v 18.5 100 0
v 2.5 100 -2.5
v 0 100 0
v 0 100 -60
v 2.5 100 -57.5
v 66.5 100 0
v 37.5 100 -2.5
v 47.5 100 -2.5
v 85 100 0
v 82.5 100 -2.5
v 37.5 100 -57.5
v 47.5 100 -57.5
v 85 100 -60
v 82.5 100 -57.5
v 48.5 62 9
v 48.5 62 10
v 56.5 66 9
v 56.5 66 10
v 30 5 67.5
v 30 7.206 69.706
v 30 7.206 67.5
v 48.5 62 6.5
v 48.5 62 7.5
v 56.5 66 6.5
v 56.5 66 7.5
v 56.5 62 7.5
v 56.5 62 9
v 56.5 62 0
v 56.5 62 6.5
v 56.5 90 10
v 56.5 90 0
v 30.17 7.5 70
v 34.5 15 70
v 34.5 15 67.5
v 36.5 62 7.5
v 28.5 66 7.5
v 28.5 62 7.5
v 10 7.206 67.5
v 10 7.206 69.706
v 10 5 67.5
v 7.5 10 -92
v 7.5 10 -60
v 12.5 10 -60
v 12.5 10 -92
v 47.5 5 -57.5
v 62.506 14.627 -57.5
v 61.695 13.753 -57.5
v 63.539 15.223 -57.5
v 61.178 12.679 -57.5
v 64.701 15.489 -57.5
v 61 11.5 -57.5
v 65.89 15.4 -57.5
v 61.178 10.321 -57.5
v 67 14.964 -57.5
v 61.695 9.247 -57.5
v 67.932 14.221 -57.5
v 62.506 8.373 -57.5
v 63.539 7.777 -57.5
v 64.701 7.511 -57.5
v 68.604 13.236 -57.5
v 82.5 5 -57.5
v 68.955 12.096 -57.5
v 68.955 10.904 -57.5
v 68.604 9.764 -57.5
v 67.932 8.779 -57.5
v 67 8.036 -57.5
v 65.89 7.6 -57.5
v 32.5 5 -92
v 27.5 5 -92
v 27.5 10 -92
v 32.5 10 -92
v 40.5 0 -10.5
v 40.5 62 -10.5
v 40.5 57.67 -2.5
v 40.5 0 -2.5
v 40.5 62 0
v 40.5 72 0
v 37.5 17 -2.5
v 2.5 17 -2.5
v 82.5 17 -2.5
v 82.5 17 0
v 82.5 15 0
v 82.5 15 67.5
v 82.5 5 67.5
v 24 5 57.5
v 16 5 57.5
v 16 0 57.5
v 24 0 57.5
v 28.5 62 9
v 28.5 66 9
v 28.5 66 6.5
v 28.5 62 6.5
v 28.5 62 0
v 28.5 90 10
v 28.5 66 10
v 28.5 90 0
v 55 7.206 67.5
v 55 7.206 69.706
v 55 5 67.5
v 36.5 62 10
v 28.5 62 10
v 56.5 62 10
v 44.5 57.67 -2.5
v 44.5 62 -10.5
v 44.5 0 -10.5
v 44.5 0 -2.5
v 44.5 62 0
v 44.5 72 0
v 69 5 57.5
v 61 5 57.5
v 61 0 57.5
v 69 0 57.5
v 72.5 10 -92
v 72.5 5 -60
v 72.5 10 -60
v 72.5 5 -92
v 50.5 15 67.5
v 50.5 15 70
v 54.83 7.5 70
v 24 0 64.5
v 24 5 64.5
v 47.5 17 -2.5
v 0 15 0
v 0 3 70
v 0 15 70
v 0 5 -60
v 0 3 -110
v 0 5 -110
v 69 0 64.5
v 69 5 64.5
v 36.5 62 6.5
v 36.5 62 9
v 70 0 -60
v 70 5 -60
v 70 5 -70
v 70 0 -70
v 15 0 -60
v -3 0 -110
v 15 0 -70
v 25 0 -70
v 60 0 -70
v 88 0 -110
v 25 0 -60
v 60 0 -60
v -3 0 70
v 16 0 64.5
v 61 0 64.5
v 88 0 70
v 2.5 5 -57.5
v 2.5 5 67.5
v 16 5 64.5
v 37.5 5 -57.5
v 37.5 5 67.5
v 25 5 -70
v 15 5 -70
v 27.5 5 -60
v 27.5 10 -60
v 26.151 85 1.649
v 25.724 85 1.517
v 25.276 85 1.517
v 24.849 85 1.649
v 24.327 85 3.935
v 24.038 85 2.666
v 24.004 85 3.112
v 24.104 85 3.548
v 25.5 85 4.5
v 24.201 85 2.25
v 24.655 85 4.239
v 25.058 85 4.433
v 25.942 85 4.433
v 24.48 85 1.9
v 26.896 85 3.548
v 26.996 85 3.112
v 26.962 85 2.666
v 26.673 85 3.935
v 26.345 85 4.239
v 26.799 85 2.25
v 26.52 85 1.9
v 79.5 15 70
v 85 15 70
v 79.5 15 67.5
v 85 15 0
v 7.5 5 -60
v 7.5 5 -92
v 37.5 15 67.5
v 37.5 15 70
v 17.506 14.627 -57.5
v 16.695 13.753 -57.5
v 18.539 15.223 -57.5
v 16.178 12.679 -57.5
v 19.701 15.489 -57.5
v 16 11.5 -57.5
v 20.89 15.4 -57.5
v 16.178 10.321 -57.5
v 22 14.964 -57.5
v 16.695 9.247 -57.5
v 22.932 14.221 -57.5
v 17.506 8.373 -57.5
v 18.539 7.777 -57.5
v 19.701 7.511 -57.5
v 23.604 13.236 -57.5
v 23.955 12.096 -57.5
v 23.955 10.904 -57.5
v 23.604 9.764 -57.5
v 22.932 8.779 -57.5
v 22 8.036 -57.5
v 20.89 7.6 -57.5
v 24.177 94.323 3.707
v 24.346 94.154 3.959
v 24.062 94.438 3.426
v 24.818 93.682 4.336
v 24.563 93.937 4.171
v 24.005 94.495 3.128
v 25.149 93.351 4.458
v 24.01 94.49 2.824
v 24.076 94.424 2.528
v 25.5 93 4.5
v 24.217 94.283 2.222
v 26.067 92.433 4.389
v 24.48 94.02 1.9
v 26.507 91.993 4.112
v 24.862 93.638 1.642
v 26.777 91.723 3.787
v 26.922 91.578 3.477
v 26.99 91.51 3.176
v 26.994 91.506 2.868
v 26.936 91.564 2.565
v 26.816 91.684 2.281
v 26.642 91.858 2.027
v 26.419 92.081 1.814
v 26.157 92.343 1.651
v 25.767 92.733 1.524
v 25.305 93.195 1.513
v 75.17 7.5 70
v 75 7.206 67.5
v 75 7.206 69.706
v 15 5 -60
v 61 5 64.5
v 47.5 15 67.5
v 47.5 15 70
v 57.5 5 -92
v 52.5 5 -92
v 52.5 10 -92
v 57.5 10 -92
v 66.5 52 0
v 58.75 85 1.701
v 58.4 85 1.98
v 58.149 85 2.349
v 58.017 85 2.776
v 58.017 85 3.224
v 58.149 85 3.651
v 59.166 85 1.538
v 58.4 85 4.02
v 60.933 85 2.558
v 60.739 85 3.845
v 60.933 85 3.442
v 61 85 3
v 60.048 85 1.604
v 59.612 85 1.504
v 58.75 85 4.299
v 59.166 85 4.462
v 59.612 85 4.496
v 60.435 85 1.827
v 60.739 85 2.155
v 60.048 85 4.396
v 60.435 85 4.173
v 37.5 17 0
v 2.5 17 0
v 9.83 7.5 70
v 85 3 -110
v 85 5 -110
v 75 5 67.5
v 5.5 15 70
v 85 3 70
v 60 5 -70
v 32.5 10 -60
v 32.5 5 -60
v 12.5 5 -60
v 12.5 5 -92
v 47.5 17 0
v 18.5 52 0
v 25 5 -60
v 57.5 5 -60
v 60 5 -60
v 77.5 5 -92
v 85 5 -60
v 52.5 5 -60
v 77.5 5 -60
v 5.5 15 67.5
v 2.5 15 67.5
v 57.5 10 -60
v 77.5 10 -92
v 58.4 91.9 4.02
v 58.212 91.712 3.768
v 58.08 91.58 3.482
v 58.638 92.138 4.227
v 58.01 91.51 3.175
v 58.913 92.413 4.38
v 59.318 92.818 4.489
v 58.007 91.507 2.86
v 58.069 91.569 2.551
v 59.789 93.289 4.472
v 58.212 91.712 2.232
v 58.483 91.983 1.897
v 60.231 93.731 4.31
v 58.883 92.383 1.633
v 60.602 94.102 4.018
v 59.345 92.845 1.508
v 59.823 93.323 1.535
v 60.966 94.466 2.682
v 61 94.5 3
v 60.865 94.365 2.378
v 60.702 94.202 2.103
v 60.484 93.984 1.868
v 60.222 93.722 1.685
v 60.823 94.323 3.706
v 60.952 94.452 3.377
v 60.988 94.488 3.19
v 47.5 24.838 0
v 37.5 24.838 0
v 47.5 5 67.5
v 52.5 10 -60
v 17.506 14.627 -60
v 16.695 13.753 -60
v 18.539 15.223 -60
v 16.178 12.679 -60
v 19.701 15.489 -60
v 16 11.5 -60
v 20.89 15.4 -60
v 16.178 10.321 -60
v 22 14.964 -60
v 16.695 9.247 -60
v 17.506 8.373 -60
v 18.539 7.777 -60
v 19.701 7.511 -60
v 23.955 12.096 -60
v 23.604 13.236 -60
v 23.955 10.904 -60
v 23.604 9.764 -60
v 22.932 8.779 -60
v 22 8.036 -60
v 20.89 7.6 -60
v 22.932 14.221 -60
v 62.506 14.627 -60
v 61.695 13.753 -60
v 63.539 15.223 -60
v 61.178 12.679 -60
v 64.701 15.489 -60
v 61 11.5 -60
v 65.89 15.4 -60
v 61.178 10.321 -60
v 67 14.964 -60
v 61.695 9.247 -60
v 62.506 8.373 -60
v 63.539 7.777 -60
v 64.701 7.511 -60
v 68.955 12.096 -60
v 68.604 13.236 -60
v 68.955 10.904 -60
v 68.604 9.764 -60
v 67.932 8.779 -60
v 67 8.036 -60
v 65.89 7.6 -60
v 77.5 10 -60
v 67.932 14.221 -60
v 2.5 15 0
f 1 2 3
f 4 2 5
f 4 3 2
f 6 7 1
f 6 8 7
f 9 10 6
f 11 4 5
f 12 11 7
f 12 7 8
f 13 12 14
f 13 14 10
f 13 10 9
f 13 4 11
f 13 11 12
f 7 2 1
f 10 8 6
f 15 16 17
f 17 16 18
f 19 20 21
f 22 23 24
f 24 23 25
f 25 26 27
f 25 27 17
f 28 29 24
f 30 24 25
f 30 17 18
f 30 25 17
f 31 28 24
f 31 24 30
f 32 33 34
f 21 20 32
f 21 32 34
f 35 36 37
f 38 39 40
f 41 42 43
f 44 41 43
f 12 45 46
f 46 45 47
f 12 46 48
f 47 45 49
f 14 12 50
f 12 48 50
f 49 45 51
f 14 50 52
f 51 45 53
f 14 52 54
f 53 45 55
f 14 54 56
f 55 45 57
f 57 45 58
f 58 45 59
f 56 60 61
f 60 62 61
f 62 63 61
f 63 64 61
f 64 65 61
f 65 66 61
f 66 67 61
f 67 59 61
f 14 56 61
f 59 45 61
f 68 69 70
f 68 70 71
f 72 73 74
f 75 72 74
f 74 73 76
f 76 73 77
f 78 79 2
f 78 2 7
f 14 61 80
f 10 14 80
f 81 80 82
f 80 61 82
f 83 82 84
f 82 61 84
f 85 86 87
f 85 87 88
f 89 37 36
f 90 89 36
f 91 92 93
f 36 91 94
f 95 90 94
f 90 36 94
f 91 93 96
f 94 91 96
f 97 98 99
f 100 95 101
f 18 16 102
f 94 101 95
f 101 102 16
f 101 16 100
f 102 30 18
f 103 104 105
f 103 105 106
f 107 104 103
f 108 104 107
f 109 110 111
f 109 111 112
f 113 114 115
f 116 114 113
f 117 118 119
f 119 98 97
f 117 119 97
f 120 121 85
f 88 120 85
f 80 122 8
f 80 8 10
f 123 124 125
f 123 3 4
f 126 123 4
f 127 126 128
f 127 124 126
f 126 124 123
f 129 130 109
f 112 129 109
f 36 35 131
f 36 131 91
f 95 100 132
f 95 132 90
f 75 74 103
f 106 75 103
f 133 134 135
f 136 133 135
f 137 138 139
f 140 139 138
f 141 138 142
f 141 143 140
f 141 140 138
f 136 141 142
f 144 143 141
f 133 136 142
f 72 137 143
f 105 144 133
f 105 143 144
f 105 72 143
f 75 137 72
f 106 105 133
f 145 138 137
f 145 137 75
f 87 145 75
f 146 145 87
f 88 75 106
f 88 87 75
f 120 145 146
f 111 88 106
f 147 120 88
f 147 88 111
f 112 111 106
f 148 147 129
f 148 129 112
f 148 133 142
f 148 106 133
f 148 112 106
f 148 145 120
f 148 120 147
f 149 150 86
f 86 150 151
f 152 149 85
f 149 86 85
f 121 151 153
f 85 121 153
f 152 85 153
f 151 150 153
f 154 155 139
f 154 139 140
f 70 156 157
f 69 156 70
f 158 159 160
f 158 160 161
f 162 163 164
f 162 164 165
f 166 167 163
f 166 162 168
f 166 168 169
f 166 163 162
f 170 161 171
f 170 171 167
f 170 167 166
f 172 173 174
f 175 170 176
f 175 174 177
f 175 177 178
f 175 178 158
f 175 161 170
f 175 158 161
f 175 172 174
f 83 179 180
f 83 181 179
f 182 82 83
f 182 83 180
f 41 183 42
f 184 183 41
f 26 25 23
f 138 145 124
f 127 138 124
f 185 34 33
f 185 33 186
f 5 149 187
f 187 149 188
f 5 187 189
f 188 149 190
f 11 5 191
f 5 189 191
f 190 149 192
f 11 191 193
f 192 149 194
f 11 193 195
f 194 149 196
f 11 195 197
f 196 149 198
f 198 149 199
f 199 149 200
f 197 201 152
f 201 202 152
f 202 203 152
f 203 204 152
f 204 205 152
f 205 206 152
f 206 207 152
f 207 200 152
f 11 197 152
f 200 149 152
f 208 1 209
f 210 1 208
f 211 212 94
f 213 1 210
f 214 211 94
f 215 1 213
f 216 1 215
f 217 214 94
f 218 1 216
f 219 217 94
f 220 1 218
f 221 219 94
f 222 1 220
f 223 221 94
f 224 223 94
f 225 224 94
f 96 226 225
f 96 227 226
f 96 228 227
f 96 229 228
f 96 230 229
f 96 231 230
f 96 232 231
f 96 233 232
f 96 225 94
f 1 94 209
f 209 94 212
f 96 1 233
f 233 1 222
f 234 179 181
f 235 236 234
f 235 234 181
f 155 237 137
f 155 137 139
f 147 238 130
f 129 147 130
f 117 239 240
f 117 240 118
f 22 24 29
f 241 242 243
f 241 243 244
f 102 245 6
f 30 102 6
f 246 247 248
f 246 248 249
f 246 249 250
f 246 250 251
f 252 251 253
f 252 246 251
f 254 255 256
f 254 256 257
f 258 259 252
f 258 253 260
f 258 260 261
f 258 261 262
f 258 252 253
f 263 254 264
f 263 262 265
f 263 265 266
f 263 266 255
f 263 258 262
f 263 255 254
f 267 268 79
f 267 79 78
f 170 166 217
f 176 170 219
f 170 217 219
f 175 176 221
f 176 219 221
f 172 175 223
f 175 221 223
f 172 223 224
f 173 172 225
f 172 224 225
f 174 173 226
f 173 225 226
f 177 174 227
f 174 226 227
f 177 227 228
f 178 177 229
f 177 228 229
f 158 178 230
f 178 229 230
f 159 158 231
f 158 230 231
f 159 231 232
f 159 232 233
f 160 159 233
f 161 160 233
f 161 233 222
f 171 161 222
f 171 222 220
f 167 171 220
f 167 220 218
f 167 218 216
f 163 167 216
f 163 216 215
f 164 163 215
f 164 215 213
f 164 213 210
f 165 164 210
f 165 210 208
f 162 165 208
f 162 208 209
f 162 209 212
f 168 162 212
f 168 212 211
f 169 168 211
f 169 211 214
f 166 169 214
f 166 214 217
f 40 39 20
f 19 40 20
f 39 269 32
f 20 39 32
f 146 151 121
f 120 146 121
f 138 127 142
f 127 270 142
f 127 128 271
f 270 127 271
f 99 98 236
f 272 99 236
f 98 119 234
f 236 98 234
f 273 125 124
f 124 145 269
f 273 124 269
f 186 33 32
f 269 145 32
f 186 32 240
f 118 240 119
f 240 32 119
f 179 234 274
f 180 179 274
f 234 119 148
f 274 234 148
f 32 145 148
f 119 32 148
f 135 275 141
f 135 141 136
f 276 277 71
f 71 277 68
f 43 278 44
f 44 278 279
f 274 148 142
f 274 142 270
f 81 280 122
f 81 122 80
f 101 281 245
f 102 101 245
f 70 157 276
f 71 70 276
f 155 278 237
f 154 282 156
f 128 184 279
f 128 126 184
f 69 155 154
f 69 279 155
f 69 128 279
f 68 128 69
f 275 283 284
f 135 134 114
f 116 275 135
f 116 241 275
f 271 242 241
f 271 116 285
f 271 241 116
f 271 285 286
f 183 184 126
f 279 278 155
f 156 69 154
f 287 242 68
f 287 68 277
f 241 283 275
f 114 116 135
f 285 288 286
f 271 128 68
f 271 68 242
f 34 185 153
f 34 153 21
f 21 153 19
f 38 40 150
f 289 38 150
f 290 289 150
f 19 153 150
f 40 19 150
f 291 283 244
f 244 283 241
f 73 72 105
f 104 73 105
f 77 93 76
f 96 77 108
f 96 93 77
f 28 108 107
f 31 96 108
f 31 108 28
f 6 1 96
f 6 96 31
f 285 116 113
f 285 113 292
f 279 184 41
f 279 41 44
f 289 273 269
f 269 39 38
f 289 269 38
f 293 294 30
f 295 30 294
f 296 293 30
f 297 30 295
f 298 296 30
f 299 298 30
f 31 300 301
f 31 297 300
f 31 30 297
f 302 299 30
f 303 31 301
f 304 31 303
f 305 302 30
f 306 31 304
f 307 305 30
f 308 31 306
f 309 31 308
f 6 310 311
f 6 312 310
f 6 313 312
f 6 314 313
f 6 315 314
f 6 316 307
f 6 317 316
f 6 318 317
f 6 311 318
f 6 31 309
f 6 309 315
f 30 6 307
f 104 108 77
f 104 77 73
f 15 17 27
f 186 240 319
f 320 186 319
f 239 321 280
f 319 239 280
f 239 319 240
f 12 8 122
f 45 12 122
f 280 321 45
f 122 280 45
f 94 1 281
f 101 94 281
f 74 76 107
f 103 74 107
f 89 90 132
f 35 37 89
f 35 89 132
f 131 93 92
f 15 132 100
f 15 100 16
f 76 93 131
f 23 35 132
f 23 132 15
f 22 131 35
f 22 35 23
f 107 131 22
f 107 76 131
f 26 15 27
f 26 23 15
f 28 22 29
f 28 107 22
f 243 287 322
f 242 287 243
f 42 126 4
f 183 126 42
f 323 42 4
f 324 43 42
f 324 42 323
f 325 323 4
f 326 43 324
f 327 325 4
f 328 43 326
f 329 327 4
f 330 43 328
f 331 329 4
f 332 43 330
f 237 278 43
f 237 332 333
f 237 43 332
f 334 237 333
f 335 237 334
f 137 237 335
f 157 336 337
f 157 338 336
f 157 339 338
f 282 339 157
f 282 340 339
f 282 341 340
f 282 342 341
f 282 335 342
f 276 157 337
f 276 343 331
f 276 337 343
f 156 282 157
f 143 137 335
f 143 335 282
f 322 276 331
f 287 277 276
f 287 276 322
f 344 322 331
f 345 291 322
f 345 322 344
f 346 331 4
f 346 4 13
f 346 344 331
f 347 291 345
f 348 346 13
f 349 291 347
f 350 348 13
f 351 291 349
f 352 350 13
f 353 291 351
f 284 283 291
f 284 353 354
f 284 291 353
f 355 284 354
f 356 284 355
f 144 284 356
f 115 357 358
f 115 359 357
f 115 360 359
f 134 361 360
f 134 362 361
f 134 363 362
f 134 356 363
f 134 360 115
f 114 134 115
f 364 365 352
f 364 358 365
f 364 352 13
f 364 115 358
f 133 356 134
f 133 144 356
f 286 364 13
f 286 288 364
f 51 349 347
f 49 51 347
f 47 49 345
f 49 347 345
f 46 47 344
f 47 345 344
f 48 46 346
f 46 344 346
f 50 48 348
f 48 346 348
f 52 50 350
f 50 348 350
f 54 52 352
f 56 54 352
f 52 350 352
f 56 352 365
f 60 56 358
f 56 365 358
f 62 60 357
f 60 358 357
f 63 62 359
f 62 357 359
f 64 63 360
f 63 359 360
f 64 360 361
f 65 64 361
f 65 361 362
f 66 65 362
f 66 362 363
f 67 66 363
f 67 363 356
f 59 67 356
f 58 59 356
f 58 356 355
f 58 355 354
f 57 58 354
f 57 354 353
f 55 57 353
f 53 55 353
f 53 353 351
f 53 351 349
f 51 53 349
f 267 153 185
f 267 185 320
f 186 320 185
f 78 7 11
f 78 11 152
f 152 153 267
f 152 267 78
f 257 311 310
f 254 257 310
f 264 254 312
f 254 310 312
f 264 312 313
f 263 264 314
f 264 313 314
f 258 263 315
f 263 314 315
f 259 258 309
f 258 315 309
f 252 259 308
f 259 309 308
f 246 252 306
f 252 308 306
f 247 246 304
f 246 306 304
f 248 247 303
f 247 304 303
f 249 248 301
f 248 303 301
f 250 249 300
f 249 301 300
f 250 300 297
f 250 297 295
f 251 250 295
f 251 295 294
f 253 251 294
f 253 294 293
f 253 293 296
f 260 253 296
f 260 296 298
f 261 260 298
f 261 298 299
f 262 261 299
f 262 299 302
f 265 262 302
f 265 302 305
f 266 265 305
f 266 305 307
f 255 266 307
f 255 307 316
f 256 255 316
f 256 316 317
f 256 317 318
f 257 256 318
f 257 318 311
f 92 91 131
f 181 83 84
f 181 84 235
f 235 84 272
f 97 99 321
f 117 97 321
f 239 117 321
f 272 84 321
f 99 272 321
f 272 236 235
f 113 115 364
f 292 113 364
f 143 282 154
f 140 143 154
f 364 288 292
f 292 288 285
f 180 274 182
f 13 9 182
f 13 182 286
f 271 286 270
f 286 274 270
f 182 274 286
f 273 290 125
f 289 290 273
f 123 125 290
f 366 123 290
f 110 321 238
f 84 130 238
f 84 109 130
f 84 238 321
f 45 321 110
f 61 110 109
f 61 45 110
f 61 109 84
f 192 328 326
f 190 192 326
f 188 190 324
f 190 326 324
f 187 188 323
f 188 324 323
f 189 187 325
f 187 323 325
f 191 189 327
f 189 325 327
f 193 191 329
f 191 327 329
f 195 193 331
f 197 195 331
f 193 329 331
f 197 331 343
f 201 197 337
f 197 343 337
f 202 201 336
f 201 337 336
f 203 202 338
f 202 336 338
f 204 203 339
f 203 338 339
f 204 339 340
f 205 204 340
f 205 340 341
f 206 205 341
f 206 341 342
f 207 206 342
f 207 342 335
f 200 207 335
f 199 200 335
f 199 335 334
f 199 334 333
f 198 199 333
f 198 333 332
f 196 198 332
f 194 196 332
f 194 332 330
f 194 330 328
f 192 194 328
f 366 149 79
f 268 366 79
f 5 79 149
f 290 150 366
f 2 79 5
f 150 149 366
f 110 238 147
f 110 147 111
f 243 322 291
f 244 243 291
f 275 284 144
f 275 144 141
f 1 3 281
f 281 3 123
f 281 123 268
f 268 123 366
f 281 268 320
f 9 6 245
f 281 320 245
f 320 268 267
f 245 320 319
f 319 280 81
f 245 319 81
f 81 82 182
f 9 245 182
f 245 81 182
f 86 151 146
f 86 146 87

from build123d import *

# Parameters (mm, degrees)
SKETCH1_W                                 = 85
SKETCH1_H                                 = 60
BOSS_EXTRUDE1_DEPTH                       = 100
CUT_EXTRUDE1_START                        = 5
SKETCH2_W                                 = 35
SKETCH2_H                                 = 55
CUT_EXTRUDE1_DEPTH                        = 95
SKETCH3_W                                 = 85
SKETCH3_H                                 = 5
BOSS_EXTRUDE2_DEPTH                       = 70
BOSS_EXTRUDE3_DEPTH                       = 10
SKETCH5_W                                 = 20
SKETCH5_H                                 = 2.5
CUT_EXTRUDE2_DEPTH                        = 7.5
SKETCH6_W                                 = 35
SKETCH6_H                                 = 12
CUT_EXTRUDE4_DEPTH                        = 57.5
CUT_EXTRUDE6_REACH                        = 186.73
SKETCH7_R                                 = 4
SKETCH9_W                                 = 85
SKETCH9_H                                 = 50
BOSS_EXTRUDE4_DEPTH                       = 5
SKETCH13_W                                = 8
SKETCH13_H                                = 7
CUT_EXTRUDE8_BUTTON_HOLES_DEPTH           = 169.374582405
SKETCH14_W                                = 28
SKETCH14_H                                = 28
BOSS_EXTRUDE5_OLED_MOUNT_DEPTH            = 10
BOSS_EXTRUDE6_OLED_MOUNT_DEPTH            = 1
BOSS_EXTRUDE7_START                       = -2.5
BOSS_EXTRUDE7_OLED_MOUNT_DEPTH            = 1
CHAMFER2_OLED_MOUNT_SIZE                  = 10
CUT_EXTRUDE7_START                        = -40.5
CUT_EXTRUDE7_OLED_CABLE_HOLE_DEPTH        = 4
CUT_EXTRUDE7_ROOF_CUTOUT_DEPTH            = 172.245437895
SKETCH18_W                                = 4
SKETCH18_H                                = 8
CUT_EXTRUDE9_OLED_CABLE_DEPTH             = 153.213665615
CHAMFER6_OLED_CABLE_HOLE_SIZE             = 2.5
CHAMFER6_OLED_CABLE_HOLE_SIZE2            = 4.330127019
SKETCH45_R                                = 1.5
CUT_EXTRUDE7_ROOF_HOLES_DEPTH             = 15
SKETCH20_W                                = 10
SKETCH20_H                                = 10
CUT_EXTRUDE10_SOLENOID_WIRE_HOLE_DEPTH    = 169.374582405
SKETCH21_W                                = 5
SKETCH21_H                                = 32
BOSS_EXTRUDE9_SOLENOID_SIDE_SUPPORT_DEPTH = 5
CHAMFER3_THUMB_SIZE                       = 2.5
CHAMFER5_THUMB_SIZE                       = 4.5
CHAMFER5_THUMB_SIZE2                      = 7.794228634
CHAMFER5_THUMB_PART_2_SIZE                = 4.5
CHAMFER5_THUMB_PART_2_SIZE2               = 7.794228634
CHAMFER5_THUMB_PART_3_SIZE                = 4.5
CHAMFER5_THUMB_PART_3_SIZE2               = 7.794228634
BOSS_EXTRUDE5_GUIDE_DEPTH                 = 180
SKETCH42_W                                = 10
SKETCH42_H                                = 70
BOSS_EXTRUDE8_DEPTH                       = 10
CHAMFER5_SIZE                             = 10
CHAMFER5_SIZE_2                           = 71.153697224


# Some blends are built 0.0001 mm under size
with BuildPart() as part:
    # Sketch1 → Boss-Extrude1 (new body)
    with BuildSketch(Plane(origin=(0, 0, 0), x_dir=(1, 0, 0), z_dir=(0, 1, 0))):
        with Locations((42.5, 30)):
            Rectangle(SKETCH1_W, SKETCH1_H)
    extrude(amount=BOSS_EXTRUDE1_DEPTH)

    # Sketch2 → Cut-Extrude1 (cut)
    with BuildSketch(Plane(origin=(0, 0, 0), x_dir=(1, 0, 0), z_dir=(0, 1, 0)).offset(CUT_EXTRUDE1_START)):
        with Locations((20, 30)):
            Rectangle(SKETCH2_W, SKETCH2_H)
        with Locations((65, 30)):
            Rectangle(SKETCH2_W, SKETCH2_H)
    extrude(amount=CUT_EXTRUDE1_DEPTH, mode=Mode.SUBTRACT)

    # Sketch3 → Boss-Extrude2 (add)
    with BuildSketch(Plane.XY):
        with Locations((42.5, 2.5)):
            Rectangle(SKETCH3_W, SKETCH3_H)
    extrude(amount=BOSS_EXTRUDE2_DEPTH)

    # Sketch4 → Boss-Extrude3 (add)
    with BuildSketch(Plane(origin=(0, 5, 0), x_dir=(1, 0, 0), z_dir=(0, 1, 0))):
        Polygon((85, 0), (82.5, 0), (82.5, -67.5), (47.5, -67.5), (47.5, 0), (37.5, 0), (37.5, -67.5), (2.5, -67.5), (2.5, 0), (0, 0), (0, -70), (85, -70), align=None)
    extrude(amount=BOSS_EXTRUDE3_DEPTH)

    # Sketch5 → Cut-Extrude2 (cut)
    with BuildSketch(Plane(origin=(0, 15, 0), x_dir=(1, 0, 0), z_dir=(0, 1, 0))):
        with Locations((20, -68.75)):
            Rectangle(SKETCH5_W, SKETCH5_H)
        with Locations((65, -68.75)):
            Rectangle(SKETCH5_W, SKETCH5_H)
    extrude(amount=-CUT_EXTRUDE2_DEPTH, mode=Mode.SUBTRACT)

    # Sketch6 → Cut-Extrude4 (cut)
    with BuildSketch(Plane.XY):
        with Locations((20, 11)):
            Rectangle(SKETCH6_W, SKETCH6_H)
        with Locations((65, 11)):
            Rectangle(SKETCH6_W, SKETCH6_H)
    extrude(amount=-CUT_EXTRUDE4_DEPTH, mode=Mode.SUBTRACT)

    # Sketch7 → Cut-Extrude6 (cut, up to next)
    with BuildSketch(Plane(origin=(0, 0, -60), x_dir=(-1, 0, 0), z_dir=(0, 0, -1)), mode=Mode.PRIVATE) as cut_extrude6_sk1:
        with Locations((-20, 11.5)):
            Circle(SKETCH7_R)
    cut_extrude6_tool1 = extrude(cut_extrude6_sk1.sketch, amount=-CUT_EXTRUDE6_REACH, mode=Mode.PRIVATE) & part.part
    # Sketch7 → Cut-Extrude6 (cut, up to next)
    with BuildSketch(Plane(origin=(0, 0, -60), x_dir=(-1, 0, 0), z_dir=(0, 0, -1)), mode=Mode.PRIVATE) as cut_extrude6_sk2:
        with Locations((-65, 11.5)):
            Circle(SKETCH7_R)
    cut_extrude6_tool2 = extrude(cut_extrude6_sk2.sketch, amount=-CUT_EXTRUDE6_REACH, mode=Mode.PRIVATE) & part.part
    add(cut_extrude6_tool1.solids().sort_by_distance((20, 11.5, -60))[0], mode=Mode.SUBTRACT)
    add(cut_extrude6_tool2.solids().sort_by_distance((65, 11.5, -60))[0], mode=Mode.SUBTRACT)

    # Sketch9 → Boss-Extrude4 (add)
    with BuildSketch(Plane(origin=(0, 0, 0), x_dir=(1, 0, 0), z_dir=(0, 1, 0))):
        with Locations((42.5, 85)):
            Rectangle(SKETCH9_W, SKETCH9_H)
    extrude(amount=BOSS_EXTRUDE4_DEPTH)

    # Sketch13 → Cut-Extrude8 (Button Holes) (cut, through all)
    with BuildSketch(Plane(origin=(0, 5, 0), x_dir=(1, 0, 0), z_dir=(0, 1, 0))):
        with Locations((20, -61)):
            Rectangle(SKETCH13_W, SKETCH13_H)
        with Locations((65, -61)):
            Rectangle(SKETCH13_W, SKETCH13_H)
    extrude(amount=-CUT_EXTRUDE8_BUTTON_HOLES_DEPTH, mode=Mode.SUBTRACT)

    # Sketch14 → Boss-Extrude5 (OLED Mount) (add)
    with BuildSketch(Plane.XY):
        Polygon((18.5, 93.172660782), (18.5, 52), (66.5, 52), (66.5, 93.172660782), (66.5, 100), (18.5, 100), align=None)
        with Locations((42.5, 76)):
            Rectangle(SKETCH14_W, SKETCH14_H, mode=Mode.SUBTRACT)
    extrude(amount=BOSS_EXTRUDE5_OLED_MOUNT_DEPTH)

    # Sketch40 → Boss-Extrude6 (OLED Mount) (add)
    with BuildSketch(Plane.XY.offset(10)):
        Polygon((28.5, 62), (36.5, 62), (28.5, 66), align=None)
        Polygon((56.5, 62), (48.5, 62), (56.5, 66), align=None)
    extrude(amount=-BOSS_EXTRUDE6_OLED_MOUNT_DEPTH)

    # Sketch40<2> → Boss-Extrude7 (OLED Mount) (add)
    with BuildSketch(Plane.XY.offset(10).offset(BOSS_EXTRUDE7_START)):
        Polygon((28.5, 62), (36.5, 62), (28.5, 66), align=None)
        Polygon((56.5, 62), (48.5, 62), (56.5, 66), align=None)
    extrude(amount=-BOSS_EXTRUDE7_OLED_MOUNT_DEPTH)

    # Chamfer2 (OLED Mount)
    chamfer2_oled_mount_edges = [part.edges().sort_by_distance(p)[0] for p in [
        (42.5, 52, 10),
        (66.5, 76, 10),
        (42.5, 100, 10),
        (18.5, 76, 10),
    ]]
    chamfer(chamfer2_oled_mount_edges, length=CHAMFER2_OLED_MOUNT_SIZE - 0.0001)  # a hair under: the kernel refuses the full size

    # Sketch44 → Cut-Extrude7 (OLED Cable Hole) (cut)
    with BuildSketch(Plane(origin=(85, 0, 0), x_dir=(0, 0, -1), z_dir=(1, 0, 0)).offset(CUT_EXTRUDE7_START)):
        Polygon((0, 62), (0, 72), (10.5, 62), align=None)
    extrude(amount=-CUT_EXTRUDE7_OLED_CABLE_HOLE_DEPTH, mode=Mode.SUBTRACT)

    # Sketch41 → Cut-Extrude7 (Roof Cutout) (cut, through all)
    with BuildSketch(Plane.XY):
        Polygon((18.5, 100), (28.5, 90), (56.5, 90), (66.5, 100), align=None)
    extrude(amount=CUT_EXTRUDE7_ROOF_CUTOUT_DEPTH, mode=Mode.SUBTRACT)

    # Sketch18 → Cut-Extrude9 (OLED Cable) (cut, through all)
    with BuildSketch(Plane(origin=(0, 62, 0), x_dir=(1, 0, 0), z_dir=(0, 1, 0))):
        with Locations((42.5, 6.5)):
            Rectangle(SKETCH18_W, SKETCH18_H)
    extrude(amount=-CUT_EXTRUDE9_OLED_CABLE_DEPTH, mode=Mode.SUBTRACT)

    # Chamfer6 (OLED Cable Hole)
    chamfer6_oled_cable_hole_edges = [part.edges().sort_by_distance(p)[0] for p in [
        (42.5, 62, -2.5),
    ]]
    chamfer6_oled_cable_hole_side = [part.faces().sort_by_distance(p)[0] for p in [
        (42.5, 62, 4.354651163),
    ]]
    chamfer(chamfer6_oled_cable_hole_edges, length=CHAMFER6_OLED_CABLE_HOLE_SIZE, length2=CHAMFER6_OLED_CABLE_HOLE_SIZE2, reference=chamfer6_oled_cable_hole_side[0])

    # Sketch45 → Cut-Extrude7 (Roof Holes) (cut)
    with BuildSketch(Plane(origin=(0, 100, 0), x_dir=(1, 0, 0), z_dir=(0, 1, 0))):
        with Locations(Location((25.5, -3, 0), (0, 0, 270))):
            Circle(SKETCH45_R)
        with Locations((59.5, -3)):
            Circle(SKETCH45_R)
    extrude(amount=-CUT_EXTRUDE7_ROOF_HOLES_DEPTH, mode=Mode.SUBTRACT)

    # Sketch20 → Cut-Extrude10 (Solenoid Wire Hole) (cut, through all)
    with BuildSketch(Plane(origin=(0, 5, 0), x_dir=(1, 0, 0), z_dir=(0, 1, 0))):
        with Locations((65, 65)):
            Rectangle(SKETCH20_W, SKETCH20_H)
        with Locations((20, 65)):
            Rectangle(SKETCH20_W, SKETCH20_H)
    extrude(amount=-CUT_EXTRUDE10_SOLENOID_WIRE_HOLE_DEPTH, mode=Mode.SUBTRACT)

    # Sketch21 → Boss-Extrude9 (Solenoid Side Support) (add)
    with BuildSketch(Plane(origin=(0, 5, 0), x_dir=(1, 0, 0), z_dir=(0, 1, 0))):
        with Locations((75, 76)):
            Rectangle(SKETCH21_W, SKETCH21_H)
        with Locations((55, 76)):
            Rectangle(SKETCH21_W, SKETCH21_H)
        with Locations((30, 76)):
            Rectangle(SKETCH21_W, SKETCH21_H)
        with Locations((10, 76)):
            Rectangle(SKETCH21_W, SKETCH21_H)
    extrude(amount=BOSS_EXTRUDE9_SOLENOID_SIDE_SUPPORT_DEPTH)

    # Chamfer3 (Thumb)
    chamfer3_thumb_edges = [part.edges().sort_by_distance(p)[0] for p in [
        (20, 7.5, 67.5),
        (65, 7.5, 67.5),
    ]]
    chamfer(chamfer3_thumb_edges, length=CHAMFER3_THUMB_SIZE - 0.0001)  # a hair under: the kernel refuses the full size

    # Chamfer5 (Thumb)
    chamfer5_thumb_edges = [part.edges().sort_by_distance(p)[0] for p in [
        (75, 15, 68.75),
    ]]
    chamfer5_thumb_side = [part.faces().sort_by_distance(p)[0] for p in [
        (83.266129032, 15, 38.266129032),
    ]]
    chamfer(chamfer5_thumb_edges, length=CHAMFER5_THUMB_SIZE, length2=CHAMFER5_THUMB_SIZE2, reference=chamfer5_thumb_side[0])

    # Chamfer5 (Thumb) part 2
    chamfer5_thumb_part_2_edges = [part.edges().sort_by_distance(p)[0] for p in [
        (55, 15, 68.75),
        (30, 15, 68.75),
    ]]
    chamfer5_thumb_part_2_side = [part.faces().sort_by_distance(p)[0] for p in [
        (42.5, 15, 36.716101695),
    ]]
    chamfer(chamfer5_thumb_part_2_edges, length=CHAMFER5_THUMB_PART_2_SIZE, length2=CHAMFER5_THUMB_PART_2_SIZE2, reference=chamfer5_thumb_part_2_side[0])

    # Chamfer5 (Thumb) part 3
    chamfer5_thumb_part_3_edges = [part.edges().sort_by_distance(p)[0] for p in [
        (10, 15, 68.75),
    ]]
    chamfer5_thumb_part_3_side = [part.faces().sort_by_distance(p)[0] for p in [
        (1.733870968, 15, 38.266129032),
    ]]
    chamfer(chamfer5_thumb_part_3_edges, length=CHAMFER5_THUMB_PART_3_SIZE, length2=CHAMFER5_THUMB_PART_3_SIZE2, reference=chamfer5_thumb_part_3_side[0])

    # Sketch37 → Boss-Extrude5 (Guide) (add, through all)
    with BuildSketch(Plane.XY.offset(70)):
        Polygon((85, 0), (88, 0), (85, 3), align=None)
        Polygon((0, 0), (-3, 0), (0, 3), align=None)
    extrude(amount=-BOSS_EXTRUDE5_GUIDE_DEPTH)

    # Sketch42 → Boss-Extrude8 (add)
    with BuildSketch(Plane(origin=(0, 15, 0), x_dir=(1, 0, 0), z_dir=(0, 1, 0))):
        with Locations((42.5, -35)):
            Rectangle(SKETCH42_W, SKETCH42_H)
    extrude(amount=BOSS_EXTRUDE8_DEPTH)

    # Chamfer5
    # the kernel refuses this chamfer: 71.153697224, 10 mm, written as the material it takes off along each edge
    with BuildSketch(Plane(origin=(232.433017826, 25, 70), x_dir=(0, -0.965159882585439, 0.2616608511941778), z_dir=(-1, 0, 0))) as chamfer5_piece_1_section:
        Polygon((CHAMFER5_SIZE * 0.965159882585, -CHAMFER5_SIZE * 0.261660851194), (-CHAMFER5_SIZE_2 * 0.261660851194, -CHAMFER5_SIZE_2 * 0.965159882583), (0, 0), align=None)
    chamfer5_piece_1 = extrude(amount=379.866035651, mode=Mode.PRIVATE)
    chamfer5_piece_1 = split(chamfer5_piece_1, bisect_by=Plane(origin=(42.5, 22.433038023, 0), z_dir=(0, 0, 1)), keep=Keep.TOP, mode=Mode.PRIVATE)
    add(chamfer5_piece_1, mode=Mode.SUBTRACT)


solid = part.part
